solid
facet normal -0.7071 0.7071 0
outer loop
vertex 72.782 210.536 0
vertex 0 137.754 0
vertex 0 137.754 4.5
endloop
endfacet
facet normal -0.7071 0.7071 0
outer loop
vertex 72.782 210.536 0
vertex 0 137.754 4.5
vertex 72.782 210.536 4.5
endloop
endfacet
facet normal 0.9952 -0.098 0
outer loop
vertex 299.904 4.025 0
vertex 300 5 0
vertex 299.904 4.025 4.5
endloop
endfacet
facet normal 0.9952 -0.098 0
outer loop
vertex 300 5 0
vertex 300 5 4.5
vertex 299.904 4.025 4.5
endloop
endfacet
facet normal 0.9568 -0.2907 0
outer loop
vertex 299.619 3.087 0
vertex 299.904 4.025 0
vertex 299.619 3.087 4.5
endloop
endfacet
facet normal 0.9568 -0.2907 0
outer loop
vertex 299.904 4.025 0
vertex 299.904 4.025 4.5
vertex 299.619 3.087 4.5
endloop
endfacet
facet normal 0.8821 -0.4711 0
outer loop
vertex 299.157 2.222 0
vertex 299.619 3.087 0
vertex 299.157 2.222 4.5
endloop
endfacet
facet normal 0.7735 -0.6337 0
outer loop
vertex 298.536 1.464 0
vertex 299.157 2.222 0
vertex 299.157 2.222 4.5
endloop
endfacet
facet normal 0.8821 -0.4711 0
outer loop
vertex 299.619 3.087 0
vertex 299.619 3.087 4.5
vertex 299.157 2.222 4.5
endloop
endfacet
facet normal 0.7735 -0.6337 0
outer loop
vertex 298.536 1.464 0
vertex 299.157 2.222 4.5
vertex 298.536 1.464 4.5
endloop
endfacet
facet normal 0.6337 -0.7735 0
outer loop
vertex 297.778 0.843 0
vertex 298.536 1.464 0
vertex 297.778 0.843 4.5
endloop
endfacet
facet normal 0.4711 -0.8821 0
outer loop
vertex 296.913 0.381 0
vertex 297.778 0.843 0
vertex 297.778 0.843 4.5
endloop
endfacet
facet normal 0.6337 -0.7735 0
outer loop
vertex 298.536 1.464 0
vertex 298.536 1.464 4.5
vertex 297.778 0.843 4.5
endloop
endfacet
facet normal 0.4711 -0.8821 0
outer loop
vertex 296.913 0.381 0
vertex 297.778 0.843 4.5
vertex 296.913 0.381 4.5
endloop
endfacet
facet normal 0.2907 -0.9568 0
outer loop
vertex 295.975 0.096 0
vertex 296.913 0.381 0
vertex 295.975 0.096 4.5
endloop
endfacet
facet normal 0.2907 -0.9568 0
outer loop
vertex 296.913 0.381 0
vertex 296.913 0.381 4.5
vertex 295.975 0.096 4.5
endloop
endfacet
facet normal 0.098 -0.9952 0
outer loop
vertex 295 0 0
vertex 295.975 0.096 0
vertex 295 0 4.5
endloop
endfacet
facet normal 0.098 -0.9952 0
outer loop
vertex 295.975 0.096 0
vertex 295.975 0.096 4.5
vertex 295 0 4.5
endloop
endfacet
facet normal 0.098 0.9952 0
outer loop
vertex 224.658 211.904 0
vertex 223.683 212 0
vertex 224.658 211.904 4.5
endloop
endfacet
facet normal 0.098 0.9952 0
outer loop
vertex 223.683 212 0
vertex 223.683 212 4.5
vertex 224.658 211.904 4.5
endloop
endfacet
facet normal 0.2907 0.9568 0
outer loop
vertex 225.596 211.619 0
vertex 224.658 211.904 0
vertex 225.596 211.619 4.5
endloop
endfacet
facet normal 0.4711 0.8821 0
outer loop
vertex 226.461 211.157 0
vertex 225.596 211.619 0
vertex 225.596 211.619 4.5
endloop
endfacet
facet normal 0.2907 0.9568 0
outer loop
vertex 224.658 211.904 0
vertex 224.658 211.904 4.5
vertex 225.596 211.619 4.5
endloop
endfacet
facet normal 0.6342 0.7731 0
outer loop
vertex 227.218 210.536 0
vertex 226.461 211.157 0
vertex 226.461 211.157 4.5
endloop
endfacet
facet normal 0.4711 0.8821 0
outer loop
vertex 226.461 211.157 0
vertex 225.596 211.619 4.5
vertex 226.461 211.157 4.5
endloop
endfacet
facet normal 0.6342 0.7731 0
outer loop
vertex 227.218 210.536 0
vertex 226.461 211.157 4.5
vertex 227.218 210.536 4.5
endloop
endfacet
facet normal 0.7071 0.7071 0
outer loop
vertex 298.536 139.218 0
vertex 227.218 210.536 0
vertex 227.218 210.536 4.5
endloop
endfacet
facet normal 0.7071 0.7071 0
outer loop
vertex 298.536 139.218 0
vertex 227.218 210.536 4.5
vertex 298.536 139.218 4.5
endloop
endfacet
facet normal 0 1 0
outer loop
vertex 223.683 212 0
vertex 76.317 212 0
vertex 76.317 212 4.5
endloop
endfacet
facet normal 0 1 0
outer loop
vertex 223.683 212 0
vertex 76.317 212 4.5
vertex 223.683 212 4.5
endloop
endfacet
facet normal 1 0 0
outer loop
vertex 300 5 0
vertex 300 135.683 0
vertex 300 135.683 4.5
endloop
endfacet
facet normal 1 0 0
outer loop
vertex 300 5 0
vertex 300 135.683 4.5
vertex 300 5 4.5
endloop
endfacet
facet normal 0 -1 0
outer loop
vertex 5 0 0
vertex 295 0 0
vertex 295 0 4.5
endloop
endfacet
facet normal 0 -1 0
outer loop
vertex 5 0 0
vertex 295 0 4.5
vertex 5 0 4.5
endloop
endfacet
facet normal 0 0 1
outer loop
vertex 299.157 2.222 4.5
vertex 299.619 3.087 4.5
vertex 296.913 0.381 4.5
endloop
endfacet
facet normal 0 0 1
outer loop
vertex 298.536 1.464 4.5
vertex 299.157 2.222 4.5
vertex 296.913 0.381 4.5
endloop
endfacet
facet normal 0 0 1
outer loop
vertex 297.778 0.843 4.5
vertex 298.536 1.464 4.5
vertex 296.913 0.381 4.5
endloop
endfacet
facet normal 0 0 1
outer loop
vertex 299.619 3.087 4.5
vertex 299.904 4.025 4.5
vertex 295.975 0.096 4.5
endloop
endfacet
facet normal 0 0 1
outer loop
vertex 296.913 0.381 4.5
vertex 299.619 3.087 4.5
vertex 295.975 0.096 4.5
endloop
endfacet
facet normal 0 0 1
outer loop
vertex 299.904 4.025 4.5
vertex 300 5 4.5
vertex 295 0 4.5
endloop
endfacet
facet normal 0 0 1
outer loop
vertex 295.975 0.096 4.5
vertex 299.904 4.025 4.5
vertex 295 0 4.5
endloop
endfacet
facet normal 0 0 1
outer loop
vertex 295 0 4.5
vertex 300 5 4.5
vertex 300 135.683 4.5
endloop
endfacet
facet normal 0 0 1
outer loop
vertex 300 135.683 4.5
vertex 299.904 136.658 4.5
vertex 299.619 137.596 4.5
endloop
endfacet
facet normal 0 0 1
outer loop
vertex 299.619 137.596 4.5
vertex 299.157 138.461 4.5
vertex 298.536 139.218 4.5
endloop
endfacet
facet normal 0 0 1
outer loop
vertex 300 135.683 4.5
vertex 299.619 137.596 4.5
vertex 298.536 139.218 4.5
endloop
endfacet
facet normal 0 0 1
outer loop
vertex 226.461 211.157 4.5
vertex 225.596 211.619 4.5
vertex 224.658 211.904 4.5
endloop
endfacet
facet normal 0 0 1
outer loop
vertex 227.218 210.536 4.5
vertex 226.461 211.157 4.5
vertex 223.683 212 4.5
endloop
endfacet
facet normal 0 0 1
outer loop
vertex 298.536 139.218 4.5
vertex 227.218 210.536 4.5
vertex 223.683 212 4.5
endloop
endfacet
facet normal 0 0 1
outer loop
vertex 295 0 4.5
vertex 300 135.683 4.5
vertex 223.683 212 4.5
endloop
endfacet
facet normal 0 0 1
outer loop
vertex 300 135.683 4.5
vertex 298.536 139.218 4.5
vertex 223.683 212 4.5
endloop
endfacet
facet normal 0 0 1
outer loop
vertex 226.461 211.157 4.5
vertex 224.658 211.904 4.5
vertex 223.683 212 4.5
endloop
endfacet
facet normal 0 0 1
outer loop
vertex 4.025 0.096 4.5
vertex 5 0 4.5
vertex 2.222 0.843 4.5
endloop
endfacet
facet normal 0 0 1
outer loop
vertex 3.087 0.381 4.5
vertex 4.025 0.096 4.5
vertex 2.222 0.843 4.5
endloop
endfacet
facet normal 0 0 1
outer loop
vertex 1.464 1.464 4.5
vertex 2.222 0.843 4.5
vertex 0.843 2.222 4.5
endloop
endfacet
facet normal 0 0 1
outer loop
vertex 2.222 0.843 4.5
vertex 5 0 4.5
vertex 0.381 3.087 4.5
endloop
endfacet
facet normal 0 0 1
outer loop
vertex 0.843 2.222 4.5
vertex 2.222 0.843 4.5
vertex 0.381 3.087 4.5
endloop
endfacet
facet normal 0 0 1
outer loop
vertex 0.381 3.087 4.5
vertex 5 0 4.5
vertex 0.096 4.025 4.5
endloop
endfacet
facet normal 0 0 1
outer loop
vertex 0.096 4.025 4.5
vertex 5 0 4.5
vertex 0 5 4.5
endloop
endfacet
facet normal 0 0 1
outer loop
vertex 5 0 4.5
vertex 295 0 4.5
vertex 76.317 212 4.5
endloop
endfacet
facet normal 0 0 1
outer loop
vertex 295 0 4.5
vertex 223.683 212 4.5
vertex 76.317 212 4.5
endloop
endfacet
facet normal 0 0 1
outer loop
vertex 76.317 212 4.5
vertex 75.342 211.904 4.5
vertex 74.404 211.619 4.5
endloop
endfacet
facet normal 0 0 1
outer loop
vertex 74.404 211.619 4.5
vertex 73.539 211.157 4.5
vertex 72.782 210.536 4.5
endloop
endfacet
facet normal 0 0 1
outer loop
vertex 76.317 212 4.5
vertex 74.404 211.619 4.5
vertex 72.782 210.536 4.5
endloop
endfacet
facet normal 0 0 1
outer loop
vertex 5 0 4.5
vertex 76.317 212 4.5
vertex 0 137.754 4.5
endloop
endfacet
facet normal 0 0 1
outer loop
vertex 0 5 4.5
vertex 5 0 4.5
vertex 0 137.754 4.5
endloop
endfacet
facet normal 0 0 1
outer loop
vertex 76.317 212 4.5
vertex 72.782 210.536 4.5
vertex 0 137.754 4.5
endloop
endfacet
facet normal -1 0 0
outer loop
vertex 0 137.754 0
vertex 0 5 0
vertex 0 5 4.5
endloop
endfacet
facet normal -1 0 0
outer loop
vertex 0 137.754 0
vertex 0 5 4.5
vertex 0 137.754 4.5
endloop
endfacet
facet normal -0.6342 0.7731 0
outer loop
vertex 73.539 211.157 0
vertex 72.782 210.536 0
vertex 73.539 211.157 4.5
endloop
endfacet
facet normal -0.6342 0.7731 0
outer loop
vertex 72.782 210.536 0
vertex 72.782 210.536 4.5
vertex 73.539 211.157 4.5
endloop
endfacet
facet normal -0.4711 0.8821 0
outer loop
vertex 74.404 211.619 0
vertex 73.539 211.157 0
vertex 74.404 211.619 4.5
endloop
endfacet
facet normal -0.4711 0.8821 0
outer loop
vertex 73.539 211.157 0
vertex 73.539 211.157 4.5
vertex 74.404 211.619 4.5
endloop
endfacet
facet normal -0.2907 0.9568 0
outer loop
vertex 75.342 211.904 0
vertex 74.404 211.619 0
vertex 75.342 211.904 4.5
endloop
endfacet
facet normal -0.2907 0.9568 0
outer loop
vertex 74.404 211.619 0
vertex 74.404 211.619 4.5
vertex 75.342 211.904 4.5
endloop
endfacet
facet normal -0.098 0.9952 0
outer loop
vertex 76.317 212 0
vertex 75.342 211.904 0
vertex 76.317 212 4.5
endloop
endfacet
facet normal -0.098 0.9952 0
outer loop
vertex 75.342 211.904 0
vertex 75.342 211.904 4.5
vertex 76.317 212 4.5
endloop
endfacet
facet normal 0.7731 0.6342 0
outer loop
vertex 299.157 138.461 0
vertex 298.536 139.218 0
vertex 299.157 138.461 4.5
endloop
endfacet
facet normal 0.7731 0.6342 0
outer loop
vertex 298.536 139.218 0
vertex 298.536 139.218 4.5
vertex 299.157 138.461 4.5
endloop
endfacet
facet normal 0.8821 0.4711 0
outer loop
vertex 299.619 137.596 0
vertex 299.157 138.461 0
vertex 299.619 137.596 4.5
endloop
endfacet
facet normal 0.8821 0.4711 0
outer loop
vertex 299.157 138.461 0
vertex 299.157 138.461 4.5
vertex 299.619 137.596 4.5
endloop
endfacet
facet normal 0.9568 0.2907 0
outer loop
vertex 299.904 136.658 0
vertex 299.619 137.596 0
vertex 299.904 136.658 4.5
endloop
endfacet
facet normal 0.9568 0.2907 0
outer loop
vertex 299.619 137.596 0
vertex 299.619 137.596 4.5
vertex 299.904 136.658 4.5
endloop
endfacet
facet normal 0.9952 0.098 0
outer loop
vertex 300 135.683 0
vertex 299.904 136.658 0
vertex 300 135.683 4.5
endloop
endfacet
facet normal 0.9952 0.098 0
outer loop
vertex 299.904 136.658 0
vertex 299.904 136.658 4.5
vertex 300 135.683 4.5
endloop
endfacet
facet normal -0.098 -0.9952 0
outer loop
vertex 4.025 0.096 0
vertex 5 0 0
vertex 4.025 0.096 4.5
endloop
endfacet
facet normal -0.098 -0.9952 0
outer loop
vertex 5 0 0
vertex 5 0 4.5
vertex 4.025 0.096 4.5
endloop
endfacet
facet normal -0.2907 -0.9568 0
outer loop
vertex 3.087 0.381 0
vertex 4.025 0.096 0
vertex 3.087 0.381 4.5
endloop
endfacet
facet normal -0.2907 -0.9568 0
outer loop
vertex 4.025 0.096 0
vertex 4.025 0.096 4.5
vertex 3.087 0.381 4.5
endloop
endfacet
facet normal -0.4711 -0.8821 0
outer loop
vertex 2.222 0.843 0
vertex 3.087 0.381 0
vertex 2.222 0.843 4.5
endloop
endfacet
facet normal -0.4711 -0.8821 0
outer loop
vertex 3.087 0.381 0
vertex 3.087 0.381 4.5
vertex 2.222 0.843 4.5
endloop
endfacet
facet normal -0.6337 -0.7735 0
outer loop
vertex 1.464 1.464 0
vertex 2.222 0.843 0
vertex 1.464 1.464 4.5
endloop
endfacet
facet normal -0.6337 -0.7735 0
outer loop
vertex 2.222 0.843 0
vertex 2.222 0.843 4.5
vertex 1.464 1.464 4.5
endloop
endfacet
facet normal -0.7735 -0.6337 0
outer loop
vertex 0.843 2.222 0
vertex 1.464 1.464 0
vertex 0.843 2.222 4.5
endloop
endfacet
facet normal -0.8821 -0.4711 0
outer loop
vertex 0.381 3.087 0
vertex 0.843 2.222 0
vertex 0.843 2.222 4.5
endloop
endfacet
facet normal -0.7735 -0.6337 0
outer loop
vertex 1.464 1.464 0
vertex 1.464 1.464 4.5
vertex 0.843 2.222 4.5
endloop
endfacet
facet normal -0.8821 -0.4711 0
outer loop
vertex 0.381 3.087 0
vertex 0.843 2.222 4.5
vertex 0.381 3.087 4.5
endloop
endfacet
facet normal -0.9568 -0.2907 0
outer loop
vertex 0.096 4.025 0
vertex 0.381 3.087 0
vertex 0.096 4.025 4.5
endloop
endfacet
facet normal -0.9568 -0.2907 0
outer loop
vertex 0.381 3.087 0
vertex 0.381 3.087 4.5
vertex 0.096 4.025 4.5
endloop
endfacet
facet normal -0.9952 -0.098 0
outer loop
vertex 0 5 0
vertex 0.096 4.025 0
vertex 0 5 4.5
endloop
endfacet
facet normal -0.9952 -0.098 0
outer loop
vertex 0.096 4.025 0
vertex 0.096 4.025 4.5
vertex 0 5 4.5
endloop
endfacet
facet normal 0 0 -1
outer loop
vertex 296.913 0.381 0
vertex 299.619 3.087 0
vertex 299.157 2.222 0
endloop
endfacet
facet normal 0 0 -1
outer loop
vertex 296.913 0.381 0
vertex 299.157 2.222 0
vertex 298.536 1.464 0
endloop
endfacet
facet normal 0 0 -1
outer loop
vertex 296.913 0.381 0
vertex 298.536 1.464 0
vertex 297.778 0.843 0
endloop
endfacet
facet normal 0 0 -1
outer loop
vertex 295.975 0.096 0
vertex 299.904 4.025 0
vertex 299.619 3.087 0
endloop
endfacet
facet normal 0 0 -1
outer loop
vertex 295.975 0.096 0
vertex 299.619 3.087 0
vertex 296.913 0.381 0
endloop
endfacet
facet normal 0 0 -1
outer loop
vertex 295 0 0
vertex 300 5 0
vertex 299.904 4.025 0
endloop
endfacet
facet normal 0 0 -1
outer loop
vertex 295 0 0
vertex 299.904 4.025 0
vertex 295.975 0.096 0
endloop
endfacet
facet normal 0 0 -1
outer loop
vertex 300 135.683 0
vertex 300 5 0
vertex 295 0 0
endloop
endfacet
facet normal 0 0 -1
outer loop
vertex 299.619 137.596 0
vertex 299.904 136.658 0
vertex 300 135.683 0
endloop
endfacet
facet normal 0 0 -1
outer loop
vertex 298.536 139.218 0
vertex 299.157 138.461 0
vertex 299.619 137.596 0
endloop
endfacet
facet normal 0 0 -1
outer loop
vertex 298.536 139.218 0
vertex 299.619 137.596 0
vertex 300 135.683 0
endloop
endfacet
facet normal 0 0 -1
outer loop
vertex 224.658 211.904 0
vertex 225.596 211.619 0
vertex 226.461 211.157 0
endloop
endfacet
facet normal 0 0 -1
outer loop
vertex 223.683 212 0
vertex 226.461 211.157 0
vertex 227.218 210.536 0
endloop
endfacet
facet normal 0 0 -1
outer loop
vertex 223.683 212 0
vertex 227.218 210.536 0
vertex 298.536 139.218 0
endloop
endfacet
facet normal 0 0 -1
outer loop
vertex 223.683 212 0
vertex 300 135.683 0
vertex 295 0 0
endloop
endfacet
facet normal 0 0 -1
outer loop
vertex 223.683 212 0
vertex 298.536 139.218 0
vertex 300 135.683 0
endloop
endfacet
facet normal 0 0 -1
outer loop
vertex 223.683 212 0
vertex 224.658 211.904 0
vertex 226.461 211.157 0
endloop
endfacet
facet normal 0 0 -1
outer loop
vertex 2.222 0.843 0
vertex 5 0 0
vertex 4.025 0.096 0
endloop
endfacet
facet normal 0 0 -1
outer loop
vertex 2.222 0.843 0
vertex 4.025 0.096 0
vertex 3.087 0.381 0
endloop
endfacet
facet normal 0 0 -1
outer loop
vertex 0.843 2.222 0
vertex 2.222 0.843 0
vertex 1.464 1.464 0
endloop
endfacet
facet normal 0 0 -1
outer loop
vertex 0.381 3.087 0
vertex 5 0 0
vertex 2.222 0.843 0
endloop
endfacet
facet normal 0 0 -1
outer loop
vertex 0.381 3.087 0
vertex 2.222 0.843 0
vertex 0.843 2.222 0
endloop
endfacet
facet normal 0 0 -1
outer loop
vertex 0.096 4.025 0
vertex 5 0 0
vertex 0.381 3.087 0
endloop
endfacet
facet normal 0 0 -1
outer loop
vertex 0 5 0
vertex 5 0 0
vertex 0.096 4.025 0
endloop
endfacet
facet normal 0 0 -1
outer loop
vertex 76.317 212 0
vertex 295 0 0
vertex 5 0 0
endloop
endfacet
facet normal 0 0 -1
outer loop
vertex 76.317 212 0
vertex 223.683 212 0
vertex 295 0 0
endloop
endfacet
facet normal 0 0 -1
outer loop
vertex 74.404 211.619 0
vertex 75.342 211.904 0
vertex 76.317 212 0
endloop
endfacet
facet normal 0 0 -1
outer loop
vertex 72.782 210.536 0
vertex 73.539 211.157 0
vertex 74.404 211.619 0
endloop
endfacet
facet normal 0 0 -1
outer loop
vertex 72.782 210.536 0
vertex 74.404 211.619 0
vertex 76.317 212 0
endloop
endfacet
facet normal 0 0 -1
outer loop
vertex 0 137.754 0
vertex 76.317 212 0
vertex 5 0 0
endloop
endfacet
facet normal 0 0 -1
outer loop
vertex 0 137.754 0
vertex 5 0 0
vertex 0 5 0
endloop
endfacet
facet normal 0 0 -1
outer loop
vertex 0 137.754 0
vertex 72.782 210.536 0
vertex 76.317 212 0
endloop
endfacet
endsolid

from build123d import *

# Parameters (mm, degrees)
BOSS_EXTRUDE1_DEPTH = 4.5
FILLET1_R           = 5


with BuildPart() as part:
    # Sketch1 → Boss-Extrude1 (new body)
    with BuildSketch(Plane.XY):
        Polygon((0, 137.753787975), (74.246212025, 212), (225.753787975, 212), (300, 137.753787975), (300, 0), (0, 0), align=None)
    extrude(amount=BOSS_EXTRUDE1_DEPTH)

    # Fillet1
    fillet1_edges = [part.edges().sort_by_distance(p)[0] for p in [
        (74.246212025, 212, 2.25),
        (225.753787975, 212, 2.25),
        (300, 137.753787975, 2.25),
        (300, 0, 2.25),
        (0, 0, 2.25),
    ]]
    fillet(fillet1_edges, radius=FILLET1_R)


solid = part.part
